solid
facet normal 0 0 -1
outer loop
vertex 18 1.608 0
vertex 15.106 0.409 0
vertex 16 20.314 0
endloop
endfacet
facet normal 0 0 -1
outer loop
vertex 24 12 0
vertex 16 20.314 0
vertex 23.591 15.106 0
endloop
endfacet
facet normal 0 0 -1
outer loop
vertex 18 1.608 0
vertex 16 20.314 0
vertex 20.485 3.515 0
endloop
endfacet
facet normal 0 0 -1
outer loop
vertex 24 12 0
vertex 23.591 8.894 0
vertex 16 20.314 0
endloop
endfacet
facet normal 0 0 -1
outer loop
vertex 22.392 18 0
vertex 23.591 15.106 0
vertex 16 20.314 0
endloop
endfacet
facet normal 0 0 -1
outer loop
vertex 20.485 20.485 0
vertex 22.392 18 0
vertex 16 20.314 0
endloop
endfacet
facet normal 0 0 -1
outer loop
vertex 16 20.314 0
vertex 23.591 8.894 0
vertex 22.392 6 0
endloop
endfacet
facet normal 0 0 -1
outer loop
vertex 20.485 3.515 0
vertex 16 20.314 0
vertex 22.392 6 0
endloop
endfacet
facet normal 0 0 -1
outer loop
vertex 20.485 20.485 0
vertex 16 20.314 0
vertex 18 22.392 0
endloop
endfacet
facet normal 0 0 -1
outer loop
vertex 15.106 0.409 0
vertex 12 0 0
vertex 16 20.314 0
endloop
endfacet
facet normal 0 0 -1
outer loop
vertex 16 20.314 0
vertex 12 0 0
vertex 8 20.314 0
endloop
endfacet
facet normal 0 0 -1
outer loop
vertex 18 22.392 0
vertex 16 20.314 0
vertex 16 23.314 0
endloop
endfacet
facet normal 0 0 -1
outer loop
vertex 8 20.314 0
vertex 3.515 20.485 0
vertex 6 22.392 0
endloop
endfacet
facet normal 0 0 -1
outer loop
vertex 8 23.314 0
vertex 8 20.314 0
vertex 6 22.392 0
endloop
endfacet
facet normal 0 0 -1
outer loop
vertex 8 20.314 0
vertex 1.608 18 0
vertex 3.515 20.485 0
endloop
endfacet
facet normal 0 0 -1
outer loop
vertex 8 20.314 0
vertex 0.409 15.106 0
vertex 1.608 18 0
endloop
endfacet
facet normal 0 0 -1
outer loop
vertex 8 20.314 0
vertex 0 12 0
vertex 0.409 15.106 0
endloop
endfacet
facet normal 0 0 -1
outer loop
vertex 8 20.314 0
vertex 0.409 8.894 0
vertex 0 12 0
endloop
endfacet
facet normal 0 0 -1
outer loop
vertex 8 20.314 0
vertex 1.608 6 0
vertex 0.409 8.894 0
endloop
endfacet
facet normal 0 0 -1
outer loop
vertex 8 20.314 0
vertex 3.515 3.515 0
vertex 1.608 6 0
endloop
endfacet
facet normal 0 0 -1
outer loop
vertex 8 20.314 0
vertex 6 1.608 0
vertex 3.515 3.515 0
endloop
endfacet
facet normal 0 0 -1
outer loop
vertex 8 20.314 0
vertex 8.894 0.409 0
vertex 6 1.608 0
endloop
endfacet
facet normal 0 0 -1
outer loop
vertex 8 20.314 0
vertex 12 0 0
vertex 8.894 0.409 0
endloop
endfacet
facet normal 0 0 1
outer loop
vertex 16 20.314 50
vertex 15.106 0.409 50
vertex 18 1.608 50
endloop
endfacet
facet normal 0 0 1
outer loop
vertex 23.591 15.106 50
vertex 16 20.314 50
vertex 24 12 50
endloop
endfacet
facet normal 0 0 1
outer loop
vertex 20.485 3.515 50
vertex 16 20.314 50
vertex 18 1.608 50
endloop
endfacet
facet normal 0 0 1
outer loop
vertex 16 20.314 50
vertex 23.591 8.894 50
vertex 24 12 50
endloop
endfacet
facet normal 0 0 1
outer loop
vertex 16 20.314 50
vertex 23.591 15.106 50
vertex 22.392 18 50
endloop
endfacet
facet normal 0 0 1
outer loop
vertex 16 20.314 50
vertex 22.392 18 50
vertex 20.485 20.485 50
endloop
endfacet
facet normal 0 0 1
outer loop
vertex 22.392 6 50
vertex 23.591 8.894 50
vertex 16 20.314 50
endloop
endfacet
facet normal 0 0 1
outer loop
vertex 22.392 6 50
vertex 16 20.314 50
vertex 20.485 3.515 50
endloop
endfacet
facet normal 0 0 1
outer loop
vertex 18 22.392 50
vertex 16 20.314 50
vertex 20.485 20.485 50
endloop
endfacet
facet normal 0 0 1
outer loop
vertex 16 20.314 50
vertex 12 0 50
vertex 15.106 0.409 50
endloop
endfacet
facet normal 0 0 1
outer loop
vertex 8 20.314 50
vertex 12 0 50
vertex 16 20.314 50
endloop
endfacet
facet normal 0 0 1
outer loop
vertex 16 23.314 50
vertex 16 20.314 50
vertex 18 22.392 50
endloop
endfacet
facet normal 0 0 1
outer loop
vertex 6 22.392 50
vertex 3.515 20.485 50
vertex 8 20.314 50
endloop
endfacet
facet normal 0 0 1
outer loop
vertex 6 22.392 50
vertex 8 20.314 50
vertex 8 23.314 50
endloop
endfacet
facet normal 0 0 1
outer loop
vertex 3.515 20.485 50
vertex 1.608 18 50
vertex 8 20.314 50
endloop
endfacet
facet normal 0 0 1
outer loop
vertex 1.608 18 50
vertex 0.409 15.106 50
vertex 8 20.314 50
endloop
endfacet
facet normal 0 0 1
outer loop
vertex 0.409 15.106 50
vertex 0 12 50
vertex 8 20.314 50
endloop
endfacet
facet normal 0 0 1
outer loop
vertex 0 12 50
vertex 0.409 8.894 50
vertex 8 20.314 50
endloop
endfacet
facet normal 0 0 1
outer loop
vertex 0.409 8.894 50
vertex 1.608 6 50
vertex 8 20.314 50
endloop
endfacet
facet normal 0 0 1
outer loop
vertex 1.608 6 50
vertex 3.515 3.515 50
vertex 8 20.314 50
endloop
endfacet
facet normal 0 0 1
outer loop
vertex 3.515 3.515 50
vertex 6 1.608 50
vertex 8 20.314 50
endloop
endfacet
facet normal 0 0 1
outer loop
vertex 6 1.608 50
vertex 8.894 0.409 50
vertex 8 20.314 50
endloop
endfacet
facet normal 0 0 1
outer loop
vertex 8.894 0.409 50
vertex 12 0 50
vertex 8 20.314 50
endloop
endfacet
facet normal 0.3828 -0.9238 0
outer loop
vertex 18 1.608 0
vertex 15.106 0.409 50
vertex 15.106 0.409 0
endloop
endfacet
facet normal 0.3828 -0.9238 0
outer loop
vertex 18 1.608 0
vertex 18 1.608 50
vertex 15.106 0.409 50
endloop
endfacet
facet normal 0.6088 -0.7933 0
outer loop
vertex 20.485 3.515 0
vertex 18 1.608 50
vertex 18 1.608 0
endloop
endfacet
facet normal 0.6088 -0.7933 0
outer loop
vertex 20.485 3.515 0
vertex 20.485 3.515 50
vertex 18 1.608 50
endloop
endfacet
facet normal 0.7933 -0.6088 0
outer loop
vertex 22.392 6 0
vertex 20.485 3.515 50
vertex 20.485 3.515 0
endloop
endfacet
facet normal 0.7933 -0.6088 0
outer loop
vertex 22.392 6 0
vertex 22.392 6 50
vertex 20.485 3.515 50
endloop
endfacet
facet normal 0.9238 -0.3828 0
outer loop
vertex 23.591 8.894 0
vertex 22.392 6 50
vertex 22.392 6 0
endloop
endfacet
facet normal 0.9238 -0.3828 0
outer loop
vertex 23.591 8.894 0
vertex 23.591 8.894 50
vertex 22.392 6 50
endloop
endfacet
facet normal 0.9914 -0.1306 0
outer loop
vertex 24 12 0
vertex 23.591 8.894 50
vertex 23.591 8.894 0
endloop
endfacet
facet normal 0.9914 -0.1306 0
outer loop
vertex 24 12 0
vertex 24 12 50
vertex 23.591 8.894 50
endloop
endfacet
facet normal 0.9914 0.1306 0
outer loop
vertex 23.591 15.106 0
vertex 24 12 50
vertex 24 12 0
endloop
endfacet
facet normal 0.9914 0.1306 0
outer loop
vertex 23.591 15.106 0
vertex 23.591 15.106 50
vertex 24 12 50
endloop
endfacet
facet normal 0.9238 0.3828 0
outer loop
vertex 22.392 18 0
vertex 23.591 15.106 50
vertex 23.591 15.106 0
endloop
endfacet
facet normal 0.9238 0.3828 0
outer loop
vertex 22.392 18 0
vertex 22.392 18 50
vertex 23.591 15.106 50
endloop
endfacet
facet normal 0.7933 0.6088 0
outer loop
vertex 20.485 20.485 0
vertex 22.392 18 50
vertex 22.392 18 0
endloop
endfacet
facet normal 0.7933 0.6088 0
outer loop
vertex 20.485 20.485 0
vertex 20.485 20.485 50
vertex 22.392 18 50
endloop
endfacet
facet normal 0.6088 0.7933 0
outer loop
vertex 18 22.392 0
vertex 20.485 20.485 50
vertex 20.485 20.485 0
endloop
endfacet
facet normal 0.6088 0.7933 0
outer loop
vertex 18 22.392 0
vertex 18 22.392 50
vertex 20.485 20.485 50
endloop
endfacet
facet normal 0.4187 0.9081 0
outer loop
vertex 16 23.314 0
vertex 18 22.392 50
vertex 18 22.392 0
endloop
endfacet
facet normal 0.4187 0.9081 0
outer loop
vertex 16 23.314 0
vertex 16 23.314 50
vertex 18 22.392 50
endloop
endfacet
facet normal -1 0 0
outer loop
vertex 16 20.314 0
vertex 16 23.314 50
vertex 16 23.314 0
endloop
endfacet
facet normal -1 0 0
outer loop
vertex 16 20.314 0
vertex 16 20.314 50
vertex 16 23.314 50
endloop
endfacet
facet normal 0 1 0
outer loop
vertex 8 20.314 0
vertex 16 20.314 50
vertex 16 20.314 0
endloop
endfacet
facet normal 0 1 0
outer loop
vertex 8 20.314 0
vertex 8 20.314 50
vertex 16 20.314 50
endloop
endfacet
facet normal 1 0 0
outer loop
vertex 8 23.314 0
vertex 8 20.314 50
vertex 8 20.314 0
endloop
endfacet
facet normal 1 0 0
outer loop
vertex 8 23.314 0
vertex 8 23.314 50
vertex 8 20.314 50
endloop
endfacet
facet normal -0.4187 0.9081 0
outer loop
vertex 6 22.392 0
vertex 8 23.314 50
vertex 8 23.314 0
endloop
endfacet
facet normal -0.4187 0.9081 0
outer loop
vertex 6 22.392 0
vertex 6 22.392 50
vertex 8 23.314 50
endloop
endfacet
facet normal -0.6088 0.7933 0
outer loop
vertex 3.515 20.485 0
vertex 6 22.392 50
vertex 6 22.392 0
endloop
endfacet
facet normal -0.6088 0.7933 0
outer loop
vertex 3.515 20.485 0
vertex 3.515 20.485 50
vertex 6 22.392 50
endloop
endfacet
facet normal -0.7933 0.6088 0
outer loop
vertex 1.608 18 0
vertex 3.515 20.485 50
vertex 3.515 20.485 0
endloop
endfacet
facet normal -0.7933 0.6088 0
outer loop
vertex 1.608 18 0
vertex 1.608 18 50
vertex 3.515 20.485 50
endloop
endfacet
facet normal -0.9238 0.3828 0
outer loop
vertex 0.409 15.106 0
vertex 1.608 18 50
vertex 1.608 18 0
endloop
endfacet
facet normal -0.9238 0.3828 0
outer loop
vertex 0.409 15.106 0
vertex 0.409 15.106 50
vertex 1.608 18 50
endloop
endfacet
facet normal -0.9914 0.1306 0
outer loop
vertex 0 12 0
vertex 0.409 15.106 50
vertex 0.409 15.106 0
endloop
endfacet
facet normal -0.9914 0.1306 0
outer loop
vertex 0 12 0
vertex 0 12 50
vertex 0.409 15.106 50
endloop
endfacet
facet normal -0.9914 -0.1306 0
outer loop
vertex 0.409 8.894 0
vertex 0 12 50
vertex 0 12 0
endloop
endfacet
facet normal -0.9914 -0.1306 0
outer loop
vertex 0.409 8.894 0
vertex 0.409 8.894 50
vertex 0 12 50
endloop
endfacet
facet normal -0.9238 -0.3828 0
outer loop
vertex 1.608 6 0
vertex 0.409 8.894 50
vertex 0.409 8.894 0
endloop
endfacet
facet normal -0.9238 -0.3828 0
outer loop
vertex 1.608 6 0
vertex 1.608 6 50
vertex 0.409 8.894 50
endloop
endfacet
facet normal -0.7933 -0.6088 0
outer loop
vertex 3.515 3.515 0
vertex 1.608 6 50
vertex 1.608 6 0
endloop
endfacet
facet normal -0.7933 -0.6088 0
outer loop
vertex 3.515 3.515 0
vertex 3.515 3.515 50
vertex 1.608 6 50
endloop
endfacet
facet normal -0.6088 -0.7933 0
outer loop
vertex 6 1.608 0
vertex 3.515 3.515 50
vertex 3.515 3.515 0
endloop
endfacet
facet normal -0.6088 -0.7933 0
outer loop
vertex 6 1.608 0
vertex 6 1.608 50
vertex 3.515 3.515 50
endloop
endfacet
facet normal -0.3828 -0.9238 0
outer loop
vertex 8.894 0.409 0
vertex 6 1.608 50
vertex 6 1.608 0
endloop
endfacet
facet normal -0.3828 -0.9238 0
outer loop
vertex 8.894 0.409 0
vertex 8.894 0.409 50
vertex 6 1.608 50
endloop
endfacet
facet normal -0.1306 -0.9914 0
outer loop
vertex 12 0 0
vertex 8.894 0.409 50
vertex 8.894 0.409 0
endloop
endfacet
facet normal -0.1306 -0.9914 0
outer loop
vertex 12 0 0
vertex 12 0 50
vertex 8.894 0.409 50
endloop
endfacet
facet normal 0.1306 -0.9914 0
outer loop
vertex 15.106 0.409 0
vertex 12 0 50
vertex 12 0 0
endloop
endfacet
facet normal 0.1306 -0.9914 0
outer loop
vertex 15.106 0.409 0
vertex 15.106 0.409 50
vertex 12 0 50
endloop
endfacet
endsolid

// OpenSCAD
$fn = 32;

// ----------------------------------------------------------------------
// Keyway shaft: d24 shaft, key 8 x 3 mm
// ----------------------------------------------------------------------

// --- parameters (mm) ---
shaft_r = 12;             // shaft radius
key_w = 8;                // keyway width
key_d = 3;                // keyway depth below the surface line
plate_t = 50;             // shaft length, Z (extrusion height)

shaft_d = 2 * shaft_r;  // shaft diameter
circle_step = 15;  // polygon sampling step, degrees

profile = [[6, 22.392], [3.515, 20.485], [1.608, 18], [0.409, 15.106], [0, 12], [0.409, 8.894], [1.608, 6], [3.515, 3.515], [6, 1.608], [8.894, 0.409], [12, 0], [15.106, 0.409], [18, 1.608], [20.485, 3.515], [22.392, 6], [23.591, 8.894], [24, 12], [23.591, 15.106], [22.392, 18], [20.485, 20.485], [18, 22.392], [16, 23.314], [16, 20.314], [8, 20.314], [8, 23.314]];  // primary outline, 25 points, counter clockwise

// --- the one profile operation ---
linear_extrude(height = plate_t) polygon(points = profile);
